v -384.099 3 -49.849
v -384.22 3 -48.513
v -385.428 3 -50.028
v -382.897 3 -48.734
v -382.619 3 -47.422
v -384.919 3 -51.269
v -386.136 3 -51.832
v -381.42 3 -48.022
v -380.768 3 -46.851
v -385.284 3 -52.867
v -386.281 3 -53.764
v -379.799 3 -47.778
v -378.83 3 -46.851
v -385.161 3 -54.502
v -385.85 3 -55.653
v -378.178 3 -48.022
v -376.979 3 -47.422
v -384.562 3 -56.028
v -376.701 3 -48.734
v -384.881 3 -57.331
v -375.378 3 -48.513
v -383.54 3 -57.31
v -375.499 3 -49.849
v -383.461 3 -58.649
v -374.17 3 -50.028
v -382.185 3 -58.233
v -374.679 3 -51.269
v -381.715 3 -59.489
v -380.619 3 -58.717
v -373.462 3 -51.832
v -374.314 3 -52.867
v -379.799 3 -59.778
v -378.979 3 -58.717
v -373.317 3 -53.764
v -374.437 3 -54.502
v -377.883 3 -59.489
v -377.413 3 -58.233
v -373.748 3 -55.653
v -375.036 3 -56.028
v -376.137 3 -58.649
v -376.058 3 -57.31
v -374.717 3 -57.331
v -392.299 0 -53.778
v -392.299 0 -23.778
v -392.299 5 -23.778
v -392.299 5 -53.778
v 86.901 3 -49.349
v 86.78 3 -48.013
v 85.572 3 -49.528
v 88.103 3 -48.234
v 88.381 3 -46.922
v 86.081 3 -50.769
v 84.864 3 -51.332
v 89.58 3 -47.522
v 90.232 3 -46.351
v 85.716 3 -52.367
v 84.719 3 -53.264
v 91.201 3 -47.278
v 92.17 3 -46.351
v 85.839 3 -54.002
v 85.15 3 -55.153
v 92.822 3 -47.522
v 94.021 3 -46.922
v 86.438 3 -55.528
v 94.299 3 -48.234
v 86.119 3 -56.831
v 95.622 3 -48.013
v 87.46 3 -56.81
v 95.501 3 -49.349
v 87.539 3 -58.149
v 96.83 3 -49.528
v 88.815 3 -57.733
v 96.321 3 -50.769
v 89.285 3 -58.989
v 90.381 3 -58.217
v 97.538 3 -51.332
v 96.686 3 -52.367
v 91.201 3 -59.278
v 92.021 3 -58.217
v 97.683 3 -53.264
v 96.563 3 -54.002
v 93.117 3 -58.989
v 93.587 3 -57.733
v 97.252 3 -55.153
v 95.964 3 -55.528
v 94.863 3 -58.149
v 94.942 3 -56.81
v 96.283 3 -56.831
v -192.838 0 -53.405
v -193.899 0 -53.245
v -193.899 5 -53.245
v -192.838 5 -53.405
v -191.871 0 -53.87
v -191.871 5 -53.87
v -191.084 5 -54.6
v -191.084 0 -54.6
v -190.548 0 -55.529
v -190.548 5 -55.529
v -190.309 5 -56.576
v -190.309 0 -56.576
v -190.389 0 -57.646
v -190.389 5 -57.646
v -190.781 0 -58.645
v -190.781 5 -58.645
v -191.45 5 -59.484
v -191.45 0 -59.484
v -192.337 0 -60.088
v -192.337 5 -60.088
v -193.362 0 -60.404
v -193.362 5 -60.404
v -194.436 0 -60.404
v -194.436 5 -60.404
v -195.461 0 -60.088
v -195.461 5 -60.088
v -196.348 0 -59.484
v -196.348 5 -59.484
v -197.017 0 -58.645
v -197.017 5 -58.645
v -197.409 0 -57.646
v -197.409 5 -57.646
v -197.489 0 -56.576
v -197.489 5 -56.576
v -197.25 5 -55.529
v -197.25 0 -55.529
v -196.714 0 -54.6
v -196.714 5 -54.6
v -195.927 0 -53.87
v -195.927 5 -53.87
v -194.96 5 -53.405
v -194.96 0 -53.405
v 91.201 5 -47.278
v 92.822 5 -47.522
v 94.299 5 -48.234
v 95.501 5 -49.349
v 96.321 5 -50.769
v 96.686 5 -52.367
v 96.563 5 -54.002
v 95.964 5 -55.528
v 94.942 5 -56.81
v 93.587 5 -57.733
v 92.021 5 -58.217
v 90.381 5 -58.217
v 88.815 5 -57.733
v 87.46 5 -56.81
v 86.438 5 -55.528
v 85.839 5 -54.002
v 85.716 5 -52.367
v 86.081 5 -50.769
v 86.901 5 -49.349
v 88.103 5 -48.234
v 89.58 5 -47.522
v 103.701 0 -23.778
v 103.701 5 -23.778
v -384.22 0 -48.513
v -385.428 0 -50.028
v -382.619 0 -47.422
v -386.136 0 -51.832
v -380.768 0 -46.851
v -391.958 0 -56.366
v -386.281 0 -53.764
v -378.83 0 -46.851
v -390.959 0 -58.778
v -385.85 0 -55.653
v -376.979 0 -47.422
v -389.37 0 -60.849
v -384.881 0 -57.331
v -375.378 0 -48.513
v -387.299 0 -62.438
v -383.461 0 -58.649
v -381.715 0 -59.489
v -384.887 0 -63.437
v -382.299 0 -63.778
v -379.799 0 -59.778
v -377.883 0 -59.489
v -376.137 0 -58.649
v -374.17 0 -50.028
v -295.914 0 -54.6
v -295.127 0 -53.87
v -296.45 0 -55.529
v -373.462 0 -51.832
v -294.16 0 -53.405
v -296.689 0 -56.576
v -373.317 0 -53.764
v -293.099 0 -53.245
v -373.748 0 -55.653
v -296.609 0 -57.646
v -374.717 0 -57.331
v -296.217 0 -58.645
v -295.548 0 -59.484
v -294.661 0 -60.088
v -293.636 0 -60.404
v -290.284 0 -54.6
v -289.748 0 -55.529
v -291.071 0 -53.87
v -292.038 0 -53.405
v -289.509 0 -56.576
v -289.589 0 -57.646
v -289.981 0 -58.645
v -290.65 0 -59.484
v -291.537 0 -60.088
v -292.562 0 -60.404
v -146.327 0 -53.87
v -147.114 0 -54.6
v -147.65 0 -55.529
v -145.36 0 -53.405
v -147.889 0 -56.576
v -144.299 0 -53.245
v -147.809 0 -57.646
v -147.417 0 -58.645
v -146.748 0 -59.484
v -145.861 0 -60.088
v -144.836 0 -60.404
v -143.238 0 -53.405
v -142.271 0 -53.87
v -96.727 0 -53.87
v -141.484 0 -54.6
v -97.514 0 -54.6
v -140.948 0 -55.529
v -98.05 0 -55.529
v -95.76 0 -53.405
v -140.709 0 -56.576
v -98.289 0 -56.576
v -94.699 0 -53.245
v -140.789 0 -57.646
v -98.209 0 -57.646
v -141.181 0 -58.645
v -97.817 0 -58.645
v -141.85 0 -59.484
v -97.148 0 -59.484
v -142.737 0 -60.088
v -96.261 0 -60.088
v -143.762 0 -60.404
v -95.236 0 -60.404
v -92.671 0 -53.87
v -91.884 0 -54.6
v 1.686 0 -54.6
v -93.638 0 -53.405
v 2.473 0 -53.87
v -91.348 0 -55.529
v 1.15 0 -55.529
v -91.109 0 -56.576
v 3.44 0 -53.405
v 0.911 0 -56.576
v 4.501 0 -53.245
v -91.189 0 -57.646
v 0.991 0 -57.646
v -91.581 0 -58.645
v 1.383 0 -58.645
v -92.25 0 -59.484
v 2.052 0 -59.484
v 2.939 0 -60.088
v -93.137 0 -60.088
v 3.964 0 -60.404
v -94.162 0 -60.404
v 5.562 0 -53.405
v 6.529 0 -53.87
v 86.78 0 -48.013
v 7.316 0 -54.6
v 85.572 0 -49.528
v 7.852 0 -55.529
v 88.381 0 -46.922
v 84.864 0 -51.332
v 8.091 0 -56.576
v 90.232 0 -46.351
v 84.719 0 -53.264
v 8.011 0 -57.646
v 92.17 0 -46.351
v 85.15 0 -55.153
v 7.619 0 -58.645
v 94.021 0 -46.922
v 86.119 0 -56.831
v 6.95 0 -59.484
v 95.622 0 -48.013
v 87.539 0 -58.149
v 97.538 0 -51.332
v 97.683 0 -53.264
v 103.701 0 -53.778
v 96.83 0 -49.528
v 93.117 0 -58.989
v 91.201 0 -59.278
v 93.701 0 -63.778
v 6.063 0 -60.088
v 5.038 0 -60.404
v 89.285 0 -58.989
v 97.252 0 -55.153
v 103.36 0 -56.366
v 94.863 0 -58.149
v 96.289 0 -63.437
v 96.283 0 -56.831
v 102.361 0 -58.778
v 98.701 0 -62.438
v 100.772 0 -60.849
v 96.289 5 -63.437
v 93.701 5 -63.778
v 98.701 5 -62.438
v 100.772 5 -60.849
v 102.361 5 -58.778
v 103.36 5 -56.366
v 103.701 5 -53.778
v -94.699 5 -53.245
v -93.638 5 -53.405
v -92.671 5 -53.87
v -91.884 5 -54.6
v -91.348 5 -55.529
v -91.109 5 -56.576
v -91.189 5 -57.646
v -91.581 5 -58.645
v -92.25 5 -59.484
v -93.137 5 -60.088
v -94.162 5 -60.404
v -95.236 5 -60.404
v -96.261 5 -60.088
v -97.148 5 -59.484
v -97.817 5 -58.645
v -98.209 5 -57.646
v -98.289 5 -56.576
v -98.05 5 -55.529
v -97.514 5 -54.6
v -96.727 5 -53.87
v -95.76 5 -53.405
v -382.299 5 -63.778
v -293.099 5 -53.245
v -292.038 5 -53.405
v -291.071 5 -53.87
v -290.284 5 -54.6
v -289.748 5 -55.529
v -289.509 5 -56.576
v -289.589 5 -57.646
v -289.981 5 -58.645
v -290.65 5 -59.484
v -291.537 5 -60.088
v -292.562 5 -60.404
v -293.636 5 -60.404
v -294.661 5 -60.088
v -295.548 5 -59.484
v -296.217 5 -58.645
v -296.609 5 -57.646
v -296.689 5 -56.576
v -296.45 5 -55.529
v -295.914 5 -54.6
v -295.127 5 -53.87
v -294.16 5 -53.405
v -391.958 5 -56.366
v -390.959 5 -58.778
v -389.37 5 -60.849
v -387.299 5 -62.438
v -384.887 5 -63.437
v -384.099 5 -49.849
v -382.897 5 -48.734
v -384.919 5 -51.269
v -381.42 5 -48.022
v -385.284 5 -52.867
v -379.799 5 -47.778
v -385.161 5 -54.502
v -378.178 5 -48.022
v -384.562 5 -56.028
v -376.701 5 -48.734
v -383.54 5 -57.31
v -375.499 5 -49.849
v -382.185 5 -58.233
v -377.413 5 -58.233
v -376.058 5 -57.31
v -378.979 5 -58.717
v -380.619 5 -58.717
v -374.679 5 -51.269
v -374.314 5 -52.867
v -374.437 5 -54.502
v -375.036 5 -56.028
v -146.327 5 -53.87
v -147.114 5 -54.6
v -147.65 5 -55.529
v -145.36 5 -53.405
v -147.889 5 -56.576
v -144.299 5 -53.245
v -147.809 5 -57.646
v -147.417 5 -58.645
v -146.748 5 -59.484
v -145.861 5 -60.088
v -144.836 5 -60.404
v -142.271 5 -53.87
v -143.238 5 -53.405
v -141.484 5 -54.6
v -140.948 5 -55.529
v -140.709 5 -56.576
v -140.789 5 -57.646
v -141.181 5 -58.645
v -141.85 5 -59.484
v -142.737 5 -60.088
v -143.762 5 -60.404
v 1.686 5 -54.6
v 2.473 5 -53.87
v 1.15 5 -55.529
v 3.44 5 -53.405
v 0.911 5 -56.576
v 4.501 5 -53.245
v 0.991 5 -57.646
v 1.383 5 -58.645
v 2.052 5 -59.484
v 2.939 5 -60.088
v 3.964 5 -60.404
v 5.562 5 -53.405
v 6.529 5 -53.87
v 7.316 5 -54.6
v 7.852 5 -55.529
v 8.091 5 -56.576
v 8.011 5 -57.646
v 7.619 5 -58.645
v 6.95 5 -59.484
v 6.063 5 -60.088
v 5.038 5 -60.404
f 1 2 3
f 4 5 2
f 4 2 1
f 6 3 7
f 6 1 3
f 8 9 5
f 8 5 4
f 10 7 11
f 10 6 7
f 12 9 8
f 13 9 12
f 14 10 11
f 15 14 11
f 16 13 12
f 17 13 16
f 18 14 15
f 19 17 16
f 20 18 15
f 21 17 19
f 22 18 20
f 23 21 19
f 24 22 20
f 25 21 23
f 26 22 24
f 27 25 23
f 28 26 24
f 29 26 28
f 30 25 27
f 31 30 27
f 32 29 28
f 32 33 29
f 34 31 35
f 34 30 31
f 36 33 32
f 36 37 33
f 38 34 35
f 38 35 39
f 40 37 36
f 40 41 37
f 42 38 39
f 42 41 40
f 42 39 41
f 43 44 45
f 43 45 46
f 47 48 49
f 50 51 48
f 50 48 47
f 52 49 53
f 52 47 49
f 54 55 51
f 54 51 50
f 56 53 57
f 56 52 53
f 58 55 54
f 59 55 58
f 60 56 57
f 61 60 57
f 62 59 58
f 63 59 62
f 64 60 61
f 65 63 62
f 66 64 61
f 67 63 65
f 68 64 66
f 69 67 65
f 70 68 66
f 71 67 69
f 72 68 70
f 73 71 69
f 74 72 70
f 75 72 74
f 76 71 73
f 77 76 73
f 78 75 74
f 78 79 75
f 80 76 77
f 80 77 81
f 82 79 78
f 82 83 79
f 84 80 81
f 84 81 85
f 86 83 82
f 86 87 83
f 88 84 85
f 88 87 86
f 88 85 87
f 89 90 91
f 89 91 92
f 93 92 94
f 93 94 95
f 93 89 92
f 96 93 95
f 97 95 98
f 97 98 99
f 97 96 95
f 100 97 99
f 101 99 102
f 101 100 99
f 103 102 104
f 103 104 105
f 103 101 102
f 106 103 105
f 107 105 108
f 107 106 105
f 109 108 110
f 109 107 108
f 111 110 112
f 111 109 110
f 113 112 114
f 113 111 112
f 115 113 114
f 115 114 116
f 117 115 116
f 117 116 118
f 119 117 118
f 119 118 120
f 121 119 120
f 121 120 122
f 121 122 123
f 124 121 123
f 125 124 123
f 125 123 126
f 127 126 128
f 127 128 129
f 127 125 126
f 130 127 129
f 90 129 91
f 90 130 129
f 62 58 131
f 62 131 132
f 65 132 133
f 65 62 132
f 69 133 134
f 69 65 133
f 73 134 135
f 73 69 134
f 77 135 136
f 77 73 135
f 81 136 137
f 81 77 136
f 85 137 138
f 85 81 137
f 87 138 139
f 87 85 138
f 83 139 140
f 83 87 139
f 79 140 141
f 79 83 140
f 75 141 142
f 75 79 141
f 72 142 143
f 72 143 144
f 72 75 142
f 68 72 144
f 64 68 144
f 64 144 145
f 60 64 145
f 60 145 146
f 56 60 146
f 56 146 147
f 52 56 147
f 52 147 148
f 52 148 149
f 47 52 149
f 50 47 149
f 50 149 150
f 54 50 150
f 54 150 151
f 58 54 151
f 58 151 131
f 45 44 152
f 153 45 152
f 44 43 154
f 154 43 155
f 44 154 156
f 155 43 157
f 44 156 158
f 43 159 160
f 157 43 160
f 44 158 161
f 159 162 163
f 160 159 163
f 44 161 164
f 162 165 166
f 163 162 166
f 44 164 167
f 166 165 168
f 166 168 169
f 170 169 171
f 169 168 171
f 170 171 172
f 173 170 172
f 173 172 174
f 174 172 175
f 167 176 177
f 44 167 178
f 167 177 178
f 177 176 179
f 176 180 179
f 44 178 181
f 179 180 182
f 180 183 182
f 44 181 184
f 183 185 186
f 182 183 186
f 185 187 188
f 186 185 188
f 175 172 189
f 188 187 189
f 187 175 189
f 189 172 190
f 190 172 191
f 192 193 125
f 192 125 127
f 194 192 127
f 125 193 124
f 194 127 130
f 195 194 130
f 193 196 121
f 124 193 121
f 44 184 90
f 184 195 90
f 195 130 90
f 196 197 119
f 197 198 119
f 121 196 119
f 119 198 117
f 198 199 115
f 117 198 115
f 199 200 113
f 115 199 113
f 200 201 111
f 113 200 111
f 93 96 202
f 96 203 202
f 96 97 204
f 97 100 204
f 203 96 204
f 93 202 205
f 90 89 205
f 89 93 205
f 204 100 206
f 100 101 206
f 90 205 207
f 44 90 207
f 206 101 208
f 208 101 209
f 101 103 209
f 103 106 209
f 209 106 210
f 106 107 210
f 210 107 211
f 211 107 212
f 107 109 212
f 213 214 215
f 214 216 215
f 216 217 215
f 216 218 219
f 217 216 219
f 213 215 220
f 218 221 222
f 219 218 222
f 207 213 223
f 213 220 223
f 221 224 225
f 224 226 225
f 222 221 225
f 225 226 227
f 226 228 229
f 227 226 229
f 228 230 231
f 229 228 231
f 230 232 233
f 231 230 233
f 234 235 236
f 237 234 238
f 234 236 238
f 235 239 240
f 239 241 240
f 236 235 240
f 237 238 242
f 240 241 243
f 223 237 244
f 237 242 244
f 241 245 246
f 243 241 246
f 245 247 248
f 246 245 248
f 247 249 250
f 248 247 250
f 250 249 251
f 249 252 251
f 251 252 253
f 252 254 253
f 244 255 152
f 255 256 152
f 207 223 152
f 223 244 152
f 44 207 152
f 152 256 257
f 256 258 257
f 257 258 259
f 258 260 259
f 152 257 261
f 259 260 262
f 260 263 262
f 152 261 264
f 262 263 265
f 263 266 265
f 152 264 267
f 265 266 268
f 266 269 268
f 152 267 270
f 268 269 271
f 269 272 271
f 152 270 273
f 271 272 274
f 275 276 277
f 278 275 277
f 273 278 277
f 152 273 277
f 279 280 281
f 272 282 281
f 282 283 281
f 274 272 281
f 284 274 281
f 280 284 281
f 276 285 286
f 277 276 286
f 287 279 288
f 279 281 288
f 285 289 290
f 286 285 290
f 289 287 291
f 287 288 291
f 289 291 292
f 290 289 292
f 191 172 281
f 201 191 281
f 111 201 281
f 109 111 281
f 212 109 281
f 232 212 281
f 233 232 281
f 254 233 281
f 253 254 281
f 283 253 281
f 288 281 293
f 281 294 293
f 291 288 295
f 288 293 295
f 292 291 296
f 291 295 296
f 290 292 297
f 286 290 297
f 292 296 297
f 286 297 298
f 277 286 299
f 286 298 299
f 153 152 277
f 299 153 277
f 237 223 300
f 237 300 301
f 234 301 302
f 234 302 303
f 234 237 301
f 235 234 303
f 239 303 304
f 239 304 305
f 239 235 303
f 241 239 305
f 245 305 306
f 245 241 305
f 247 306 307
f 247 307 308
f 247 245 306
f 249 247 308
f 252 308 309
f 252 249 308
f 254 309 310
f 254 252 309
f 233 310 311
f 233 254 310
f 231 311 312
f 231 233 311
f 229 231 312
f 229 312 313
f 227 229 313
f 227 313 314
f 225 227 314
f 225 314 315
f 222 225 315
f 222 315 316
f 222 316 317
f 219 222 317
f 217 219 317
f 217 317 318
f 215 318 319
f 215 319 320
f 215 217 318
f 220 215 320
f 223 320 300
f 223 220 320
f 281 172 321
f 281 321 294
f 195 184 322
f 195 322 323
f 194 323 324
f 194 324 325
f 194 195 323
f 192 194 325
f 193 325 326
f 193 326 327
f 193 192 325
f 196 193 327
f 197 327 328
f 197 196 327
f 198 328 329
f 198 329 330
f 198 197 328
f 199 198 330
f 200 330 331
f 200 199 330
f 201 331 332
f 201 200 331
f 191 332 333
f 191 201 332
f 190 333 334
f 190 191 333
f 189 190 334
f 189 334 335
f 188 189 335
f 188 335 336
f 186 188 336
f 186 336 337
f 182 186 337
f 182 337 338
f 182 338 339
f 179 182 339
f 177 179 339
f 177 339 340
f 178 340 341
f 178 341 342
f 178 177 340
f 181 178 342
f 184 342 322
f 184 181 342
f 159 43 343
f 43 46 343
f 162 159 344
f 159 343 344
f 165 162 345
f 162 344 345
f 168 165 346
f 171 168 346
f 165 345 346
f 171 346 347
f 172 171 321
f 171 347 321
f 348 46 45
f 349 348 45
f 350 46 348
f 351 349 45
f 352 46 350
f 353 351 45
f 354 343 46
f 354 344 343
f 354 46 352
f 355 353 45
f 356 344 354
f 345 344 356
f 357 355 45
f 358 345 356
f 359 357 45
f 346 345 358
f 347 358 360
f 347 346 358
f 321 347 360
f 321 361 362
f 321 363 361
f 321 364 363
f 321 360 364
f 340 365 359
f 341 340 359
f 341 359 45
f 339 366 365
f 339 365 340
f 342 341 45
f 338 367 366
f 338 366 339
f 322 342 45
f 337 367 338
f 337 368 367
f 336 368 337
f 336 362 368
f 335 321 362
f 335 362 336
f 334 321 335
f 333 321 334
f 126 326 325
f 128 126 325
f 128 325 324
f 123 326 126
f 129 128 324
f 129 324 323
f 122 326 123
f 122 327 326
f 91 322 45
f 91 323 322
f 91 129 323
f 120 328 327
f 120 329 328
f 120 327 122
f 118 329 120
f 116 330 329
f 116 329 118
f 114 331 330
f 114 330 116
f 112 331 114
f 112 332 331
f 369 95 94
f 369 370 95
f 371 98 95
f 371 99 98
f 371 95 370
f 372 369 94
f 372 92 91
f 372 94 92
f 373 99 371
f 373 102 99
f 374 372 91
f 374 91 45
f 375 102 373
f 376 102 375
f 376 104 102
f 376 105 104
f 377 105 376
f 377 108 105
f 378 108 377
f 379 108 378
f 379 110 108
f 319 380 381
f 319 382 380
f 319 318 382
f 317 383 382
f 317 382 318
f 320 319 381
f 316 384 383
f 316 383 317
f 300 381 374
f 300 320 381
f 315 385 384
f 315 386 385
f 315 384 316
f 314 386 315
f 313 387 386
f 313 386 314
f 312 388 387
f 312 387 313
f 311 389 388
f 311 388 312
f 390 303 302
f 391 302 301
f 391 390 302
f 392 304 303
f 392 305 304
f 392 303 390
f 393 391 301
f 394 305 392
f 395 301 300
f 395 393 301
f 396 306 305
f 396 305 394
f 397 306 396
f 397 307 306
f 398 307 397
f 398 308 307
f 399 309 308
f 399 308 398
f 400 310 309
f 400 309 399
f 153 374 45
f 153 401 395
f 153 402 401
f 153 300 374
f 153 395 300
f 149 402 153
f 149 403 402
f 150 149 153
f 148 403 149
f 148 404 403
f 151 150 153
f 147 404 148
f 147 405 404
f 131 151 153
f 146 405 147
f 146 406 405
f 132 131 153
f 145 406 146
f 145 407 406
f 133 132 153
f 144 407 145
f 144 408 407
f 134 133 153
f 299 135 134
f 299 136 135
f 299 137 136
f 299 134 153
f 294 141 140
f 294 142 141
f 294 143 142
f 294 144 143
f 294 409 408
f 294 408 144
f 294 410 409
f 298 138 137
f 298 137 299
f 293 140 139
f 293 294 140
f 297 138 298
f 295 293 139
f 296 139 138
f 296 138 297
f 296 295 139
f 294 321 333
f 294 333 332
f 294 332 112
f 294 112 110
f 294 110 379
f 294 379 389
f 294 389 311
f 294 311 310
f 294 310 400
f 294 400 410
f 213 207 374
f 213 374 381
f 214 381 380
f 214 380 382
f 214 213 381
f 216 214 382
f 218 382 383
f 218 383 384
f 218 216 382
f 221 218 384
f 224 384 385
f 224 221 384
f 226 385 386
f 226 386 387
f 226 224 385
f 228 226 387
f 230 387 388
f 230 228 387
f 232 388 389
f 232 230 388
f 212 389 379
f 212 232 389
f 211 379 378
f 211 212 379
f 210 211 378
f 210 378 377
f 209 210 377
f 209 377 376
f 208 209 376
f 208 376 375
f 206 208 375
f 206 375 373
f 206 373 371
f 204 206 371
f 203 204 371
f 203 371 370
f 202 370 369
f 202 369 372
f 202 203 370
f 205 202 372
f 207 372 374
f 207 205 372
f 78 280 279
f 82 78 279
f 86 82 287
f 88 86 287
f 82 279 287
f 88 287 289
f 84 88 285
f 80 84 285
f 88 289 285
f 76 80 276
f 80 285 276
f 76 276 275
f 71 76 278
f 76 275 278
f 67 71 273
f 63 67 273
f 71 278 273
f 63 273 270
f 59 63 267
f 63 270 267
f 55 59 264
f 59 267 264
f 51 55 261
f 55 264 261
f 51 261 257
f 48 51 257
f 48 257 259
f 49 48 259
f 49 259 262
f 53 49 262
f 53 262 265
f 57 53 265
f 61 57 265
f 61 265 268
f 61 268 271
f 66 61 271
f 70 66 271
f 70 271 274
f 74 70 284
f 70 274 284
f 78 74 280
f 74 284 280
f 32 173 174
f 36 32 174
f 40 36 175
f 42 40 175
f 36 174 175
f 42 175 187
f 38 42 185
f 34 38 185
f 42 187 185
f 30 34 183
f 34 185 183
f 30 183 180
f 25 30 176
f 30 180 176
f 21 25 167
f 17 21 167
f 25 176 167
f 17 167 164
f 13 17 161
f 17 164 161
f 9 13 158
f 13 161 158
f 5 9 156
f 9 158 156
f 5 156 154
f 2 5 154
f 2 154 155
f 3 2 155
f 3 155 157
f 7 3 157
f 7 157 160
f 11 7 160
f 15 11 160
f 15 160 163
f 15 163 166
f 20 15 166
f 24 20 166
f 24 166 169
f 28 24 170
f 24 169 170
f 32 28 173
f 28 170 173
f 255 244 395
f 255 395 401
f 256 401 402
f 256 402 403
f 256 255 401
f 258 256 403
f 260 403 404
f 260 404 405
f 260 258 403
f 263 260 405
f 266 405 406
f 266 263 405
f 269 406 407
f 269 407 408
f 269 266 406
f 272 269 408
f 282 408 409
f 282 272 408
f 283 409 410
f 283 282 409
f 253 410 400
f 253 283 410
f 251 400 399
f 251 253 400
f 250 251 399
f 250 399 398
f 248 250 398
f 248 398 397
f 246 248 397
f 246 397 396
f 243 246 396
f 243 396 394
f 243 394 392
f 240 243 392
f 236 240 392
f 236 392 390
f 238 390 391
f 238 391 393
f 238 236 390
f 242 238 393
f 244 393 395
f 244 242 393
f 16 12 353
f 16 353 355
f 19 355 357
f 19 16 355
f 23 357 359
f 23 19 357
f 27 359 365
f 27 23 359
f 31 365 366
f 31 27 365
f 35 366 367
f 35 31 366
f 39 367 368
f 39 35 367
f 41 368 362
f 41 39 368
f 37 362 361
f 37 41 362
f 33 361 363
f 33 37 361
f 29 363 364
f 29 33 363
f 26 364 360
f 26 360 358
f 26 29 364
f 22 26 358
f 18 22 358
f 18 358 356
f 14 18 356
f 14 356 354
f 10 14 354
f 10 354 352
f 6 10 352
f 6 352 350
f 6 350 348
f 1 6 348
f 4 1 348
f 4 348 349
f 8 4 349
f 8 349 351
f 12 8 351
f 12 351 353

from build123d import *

# Parameters (mm, degrees)
SKETCH1_W           = 496
SKETCH1_H           = 40
SKETCH1_R           = 5.5
SKETCH1_R_2         = 3.6
BOSS_EXTRUDE1_DEPTH = 5
SKETCH2_R           = 6.5
CUT_EXTRUDE1_DEPTH  = 3
FILLET1_R           = 10


with BuildPart() as part:
    # Sketch1 → Boss-Extrude1 (new body)
    with BuildSketch(Plane(origin=(0, 0, 0), x_dir=(1, 0, 0), z_dir=(0, 1, 0))):
        with Locations((-144.299026304, 43.778006447)):
            Rectangle(SKETCH1_W, SKETCH1_H)
        with Locations(Location((-379.799026304, 53.278006447, 0), (0, 0, 270))):
            Circle(SKETCH1_R, mode=Mode.SUBTRACT)
        with Locations(Location((91.200973696, 52.778006447, 0), (0, 0, 270))):
            Circle(SKETCH1_R, mode=Mode.SUBTRACT)
        with Locations(Location((-293.099026304, 56.844673113, 0), (0, 0, 270))):
            Circle(SKETCH1_R_2, mode=Mode.SUBTRACT)
        with Locations(Location((-193.899026304, 56.844673113, 0), (0, 0, 270))):
            Circle(SKETCH1_R_2, mode=Mode.SUBTRACT)
        with Locations(Location((-94.699026304, 56.844673113, 0), (0, 0, 270))):
            Circle(SKETCH1_R_2, mode=Mode.SUBTRACT)
        with Locations(Location((4.500973696, 56.844673113, 0), (0, 0, 270))):
            Circle(SKETCH1_R_2, mode=Mode.SUBTRACT)
        with Locations(Location((-144.299026304, 56.844673113, 0), (0, 0, 270))):
            Circle(SKETCH1_R_2, mode=Mode.SUBTRACT)
    extrude(amount=BOSS_EXTRUDE1_DEPTH)

    # Sketch2 → Cut-Extrude1 (cut)
    with BuildSketch(Plane.XZ):
        with Locations(Location((-379.799026304, -53.278006447, 0), (0, 0, 270))):
            Circle(SKETCH2_R)
        with Locations(Location((91.200973696, -52.778006447, 0), (0, 0, 270))):
            Circle(SKETCH2_R)
    extrude(amount=-CUT_EXTRUDE1_DEPTH, mode=Mode.SUBTRACT)

    # Fillet1
    fillet1_edges = [part.edges().sort_by_distance(p)[0] for p in [
        (-392.299026304, 2.5, -63.778006447),
        (103.700973696, 2.5, -63.778006447),
    ]]
    fillet(fillet1_edges, radius=FILLET1_R)


solid = part.part
